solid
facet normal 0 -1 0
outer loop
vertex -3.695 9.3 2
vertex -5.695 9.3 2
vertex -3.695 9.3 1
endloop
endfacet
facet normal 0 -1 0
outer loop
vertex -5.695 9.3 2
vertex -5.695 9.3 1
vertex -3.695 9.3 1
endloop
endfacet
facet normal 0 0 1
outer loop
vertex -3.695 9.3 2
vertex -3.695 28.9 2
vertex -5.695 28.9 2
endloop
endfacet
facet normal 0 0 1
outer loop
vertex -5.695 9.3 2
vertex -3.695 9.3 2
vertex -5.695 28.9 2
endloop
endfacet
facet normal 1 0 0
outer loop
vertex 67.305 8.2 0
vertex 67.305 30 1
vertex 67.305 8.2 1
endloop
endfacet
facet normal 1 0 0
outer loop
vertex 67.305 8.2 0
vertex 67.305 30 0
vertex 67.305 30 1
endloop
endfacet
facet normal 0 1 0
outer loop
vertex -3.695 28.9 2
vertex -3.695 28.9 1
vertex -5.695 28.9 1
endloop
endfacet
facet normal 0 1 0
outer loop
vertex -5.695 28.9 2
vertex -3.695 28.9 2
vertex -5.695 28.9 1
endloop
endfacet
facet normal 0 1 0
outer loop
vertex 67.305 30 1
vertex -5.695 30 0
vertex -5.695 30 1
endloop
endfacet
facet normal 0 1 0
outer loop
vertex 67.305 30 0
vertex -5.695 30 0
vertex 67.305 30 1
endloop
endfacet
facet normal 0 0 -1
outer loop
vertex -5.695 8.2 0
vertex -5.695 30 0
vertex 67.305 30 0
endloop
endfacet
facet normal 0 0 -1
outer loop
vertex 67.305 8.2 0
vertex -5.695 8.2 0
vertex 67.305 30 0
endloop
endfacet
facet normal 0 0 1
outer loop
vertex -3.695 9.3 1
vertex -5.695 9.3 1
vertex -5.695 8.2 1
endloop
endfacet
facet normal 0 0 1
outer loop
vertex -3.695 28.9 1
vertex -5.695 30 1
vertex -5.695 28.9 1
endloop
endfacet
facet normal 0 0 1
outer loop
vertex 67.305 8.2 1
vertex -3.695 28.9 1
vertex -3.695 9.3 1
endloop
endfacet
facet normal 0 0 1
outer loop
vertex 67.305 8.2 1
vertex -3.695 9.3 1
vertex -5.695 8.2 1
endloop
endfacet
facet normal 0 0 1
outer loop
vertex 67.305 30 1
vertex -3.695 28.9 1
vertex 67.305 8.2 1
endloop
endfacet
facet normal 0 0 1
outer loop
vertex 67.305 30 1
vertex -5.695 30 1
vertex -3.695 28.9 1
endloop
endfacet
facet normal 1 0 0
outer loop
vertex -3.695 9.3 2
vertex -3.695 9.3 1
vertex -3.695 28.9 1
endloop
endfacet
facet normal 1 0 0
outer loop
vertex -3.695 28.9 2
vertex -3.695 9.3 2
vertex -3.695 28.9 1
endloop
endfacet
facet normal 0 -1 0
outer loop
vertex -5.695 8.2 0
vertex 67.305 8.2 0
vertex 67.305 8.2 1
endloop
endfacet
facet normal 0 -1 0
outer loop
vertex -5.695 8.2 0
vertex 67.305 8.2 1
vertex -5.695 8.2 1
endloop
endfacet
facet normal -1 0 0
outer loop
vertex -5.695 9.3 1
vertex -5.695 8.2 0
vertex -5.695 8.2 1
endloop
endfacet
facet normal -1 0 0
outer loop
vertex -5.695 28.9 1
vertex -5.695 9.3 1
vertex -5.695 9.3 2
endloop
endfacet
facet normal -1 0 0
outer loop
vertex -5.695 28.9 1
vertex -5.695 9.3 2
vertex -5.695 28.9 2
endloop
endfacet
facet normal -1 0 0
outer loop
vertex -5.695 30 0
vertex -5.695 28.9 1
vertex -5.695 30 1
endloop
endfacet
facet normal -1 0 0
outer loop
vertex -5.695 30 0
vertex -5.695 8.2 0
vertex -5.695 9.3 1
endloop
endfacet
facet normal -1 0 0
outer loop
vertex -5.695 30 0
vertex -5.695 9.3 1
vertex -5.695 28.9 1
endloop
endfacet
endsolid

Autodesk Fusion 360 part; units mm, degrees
sketch "Esquisse1" plane through (0, 0, 0) normal (0, 0, 1) x (1, 0, 0)
  line L0 (-5.6946, 30) -> (67.3054, 30)
  line L1 (67.3054, 30) -> (67.3054, 8.2)
  line L2 (67.3054, 8.2) -> (-5.6946, 8.2)
  line L3 (-5.6946, 8.2) -> (-5.6946, 30)
  dimension "d1" = 73
  dimension "d2" = 21.8
extrude "Extrusion1" add sketch "Esquisse1" along normal blind 1
sketch "Esquisse2" plane through (0, 0, 1) normal (0, 0, 1) x (-1, 0, 0)
  line L0 (5.6946, -8.2) -> (-67.3054, -8.2)
  line L1 (-67.3054, -8.2) -> (-67.3054, -30)
  line L2 (-67.3054, -30) -> (5.6946, -30)
  line L3 (5.6946, -30) -> (5.6946, -8.2)
  line L4 (5.6946, -9.3) -> (3.6946, -9.3)
  line L5 (3.6946, -9.3) -> (3.6946, -28.9)
  line L6 (3.6946, -28.9) -> (5.6946, -28.9)
  line L7 (5.6946, -28.9) -> (5.6946, -9.3)
  line L8 (-67.3054, -19.1) -> (5.6946, -19.1) construction
  dimension "d5" = 19.6
  dimension "d8" = 2
extrude "Extrusion2" add sketch "Esquisse2" along normal blind 1 contours L3 L4 L5 L6 L7
equation "d8 = DesignConfigurationRule.64bc9023-8e4e-4cc4-8a85-19370bf7f1c2.dsgcfgrule"
